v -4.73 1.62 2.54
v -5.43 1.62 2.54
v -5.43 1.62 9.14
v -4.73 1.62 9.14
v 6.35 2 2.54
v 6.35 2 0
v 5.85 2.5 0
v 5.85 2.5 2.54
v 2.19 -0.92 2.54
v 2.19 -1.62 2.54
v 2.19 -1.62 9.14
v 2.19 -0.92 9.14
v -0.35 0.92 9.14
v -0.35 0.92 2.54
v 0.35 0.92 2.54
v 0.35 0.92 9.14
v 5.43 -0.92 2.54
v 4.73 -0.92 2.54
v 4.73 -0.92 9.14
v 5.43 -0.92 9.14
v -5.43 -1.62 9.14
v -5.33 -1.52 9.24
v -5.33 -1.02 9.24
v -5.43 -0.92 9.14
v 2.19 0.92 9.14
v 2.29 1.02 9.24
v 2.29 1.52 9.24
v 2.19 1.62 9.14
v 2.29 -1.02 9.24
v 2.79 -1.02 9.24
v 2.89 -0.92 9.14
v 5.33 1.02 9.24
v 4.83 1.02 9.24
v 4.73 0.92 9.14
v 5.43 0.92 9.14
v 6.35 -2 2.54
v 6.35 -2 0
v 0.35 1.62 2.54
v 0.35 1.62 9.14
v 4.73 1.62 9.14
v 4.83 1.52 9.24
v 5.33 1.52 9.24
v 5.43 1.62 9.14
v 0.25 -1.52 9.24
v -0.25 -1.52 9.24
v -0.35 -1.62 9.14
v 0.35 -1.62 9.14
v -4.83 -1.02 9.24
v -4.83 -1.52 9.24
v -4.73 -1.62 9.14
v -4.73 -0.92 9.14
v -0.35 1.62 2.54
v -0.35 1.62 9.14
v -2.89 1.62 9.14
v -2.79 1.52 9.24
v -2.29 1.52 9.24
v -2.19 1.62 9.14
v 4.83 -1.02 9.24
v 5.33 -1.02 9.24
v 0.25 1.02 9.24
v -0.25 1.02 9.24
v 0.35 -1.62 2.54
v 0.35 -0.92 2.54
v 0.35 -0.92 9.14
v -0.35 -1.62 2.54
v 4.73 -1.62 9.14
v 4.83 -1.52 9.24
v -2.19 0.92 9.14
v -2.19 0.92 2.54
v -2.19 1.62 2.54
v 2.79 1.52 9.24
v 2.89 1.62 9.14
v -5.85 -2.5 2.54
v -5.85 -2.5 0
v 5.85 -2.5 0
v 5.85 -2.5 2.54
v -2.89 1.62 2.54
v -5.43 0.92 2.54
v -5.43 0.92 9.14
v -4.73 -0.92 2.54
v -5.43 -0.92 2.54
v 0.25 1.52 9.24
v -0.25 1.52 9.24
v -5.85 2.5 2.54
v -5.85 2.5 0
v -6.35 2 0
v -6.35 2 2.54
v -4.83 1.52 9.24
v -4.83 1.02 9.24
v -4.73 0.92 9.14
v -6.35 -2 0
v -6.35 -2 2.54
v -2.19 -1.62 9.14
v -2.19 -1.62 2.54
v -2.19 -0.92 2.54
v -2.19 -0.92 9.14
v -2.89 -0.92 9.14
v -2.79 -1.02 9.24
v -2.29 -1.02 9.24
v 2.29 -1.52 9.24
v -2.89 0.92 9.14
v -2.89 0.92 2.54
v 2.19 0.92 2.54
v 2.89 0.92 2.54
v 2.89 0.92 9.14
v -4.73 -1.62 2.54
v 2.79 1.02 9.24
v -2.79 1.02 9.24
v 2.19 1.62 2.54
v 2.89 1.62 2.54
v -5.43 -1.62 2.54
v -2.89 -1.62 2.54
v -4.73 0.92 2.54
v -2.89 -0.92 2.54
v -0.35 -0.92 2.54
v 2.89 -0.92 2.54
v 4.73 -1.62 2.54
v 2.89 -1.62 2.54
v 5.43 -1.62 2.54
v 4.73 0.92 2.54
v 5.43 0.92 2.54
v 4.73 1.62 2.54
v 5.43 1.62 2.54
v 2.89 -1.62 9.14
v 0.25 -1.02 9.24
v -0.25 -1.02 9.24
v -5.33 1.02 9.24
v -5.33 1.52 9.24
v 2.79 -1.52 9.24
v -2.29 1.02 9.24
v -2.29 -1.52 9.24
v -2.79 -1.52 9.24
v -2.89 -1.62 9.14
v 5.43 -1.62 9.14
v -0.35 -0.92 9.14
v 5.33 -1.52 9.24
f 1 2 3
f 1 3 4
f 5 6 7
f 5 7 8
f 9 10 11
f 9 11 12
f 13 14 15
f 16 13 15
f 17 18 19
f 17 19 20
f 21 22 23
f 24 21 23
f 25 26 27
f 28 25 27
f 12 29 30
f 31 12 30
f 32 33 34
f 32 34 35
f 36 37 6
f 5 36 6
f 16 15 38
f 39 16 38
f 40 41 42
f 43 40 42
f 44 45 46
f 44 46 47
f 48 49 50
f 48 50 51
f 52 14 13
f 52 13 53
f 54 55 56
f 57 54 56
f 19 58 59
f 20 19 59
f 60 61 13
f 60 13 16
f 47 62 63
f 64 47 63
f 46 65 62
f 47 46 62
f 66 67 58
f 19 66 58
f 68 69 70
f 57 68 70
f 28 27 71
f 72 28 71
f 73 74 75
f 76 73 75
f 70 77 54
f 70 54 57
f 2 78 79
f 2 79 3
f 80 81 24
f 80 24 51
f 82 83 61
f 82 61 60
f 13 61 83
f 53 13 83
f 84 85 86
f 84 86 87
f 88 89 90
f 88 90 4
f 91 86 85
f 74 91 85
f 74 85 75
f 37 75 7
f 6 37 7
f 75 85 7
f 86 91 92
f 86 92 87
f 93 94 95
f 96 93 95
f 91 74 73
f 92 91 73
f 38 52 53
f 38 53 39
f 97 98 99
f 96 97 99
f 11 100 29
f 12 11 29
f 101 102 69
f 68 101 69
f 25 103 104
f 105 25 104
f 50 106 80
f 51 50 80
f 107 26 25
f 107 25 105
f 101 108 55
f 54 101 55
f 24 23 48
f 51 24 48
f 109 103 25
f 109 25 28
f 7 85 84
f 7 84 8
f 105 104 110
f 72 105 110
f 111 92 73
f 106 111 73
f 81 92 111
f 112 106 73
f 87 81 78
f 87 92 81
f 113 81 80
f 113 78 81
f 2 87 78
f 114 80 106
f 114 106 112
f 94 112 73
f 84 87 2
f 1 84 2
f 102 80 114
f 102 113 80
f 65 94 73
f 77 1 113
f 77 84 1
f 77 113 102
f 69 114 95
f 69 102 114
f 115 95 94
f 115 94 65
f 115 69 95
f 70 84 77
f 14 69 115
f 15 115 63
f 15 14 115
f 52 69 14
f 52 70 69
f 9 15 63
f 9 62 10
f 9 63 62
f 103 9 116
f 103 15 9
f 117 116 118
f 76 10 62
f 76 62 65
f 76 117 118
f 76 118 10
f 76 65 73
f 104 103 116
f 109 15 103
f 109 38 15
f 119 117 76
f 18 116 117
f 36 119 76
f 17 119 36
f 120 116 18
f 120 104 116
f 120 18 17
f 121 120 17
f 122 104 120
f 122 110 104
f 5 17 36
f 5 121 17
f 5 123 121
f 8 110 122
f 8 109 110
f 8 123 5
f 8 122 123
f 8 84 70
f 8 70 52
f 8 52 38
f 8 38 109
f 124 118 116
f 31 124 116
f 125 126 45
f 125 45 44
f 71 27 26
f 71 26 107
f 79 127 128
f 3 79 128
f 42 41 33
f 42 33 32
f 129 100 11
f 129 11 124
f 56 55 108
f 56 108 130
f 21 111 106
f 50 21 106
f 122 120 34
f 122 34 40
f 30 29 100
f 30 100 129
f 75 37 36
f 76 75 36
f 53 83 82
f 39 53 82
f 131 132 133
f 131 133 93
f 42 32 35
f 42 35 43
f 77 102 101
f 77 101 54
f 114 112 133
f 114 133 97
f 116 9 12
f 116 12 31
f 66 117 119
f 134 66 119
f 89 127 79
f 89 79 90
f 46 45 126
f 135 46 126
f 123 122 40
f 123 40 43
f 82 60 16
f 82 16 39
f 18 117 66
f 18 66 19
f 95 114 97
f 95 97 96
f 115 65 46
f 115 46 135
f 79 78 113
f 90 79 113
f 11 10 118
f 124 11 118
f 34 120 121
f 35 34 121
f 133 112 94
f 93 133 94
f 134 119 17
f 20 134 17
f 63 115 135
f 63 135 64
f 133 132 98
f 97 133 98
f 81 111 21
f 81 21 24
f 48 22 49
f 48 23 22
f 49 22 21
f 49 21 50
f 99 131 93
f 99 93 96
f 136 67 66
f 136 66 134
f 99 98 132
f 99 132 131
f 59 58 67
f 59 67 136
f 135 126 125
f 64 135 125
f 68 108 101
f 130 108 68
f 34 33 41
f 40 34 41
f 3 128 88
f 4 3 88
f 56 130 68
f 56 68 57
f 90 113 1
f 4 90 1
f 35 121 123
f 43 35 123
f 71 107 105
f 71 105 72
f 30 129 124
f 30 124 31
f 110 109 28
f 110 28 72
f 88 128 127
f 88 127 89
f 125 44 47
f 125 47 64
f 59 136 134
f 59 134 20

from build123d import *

# Parameters (mm, degrees)
SKETCH1_W           = 12.7
SKETCH1_H           = 5
BOSS_EXTRUDE1_DEPTH = 2.54
SKETCH2_W           = 0.7
SKETCH2_H           = 0.7
BOSS_EXTRUDE2_DEPTH = 6.7
CHAMFER1_SIZE       = 0.5
CHAMFER2_SIZE       = 0.1


with BuildPart() as part:
    # Sketch1 → Boss-Extrude1 (new body)
    with BuildSketch(Plane.XY):
        Rectangle(SKETCH1_W, SKETCH1_H)
    extrude(amount=BOSS_EXTRUDE1_DEPTH)

    # Sketch2 → Boss-Extrude2 (add)
    with BuildSketch(Plane.XY.offset(2.54)):
        with Locations((-2.54, 1.27)):
            Rectangle(SKETCH2_W, SKETCH2_H)
        with Locations((-5.08, 1.27)):
            Rectangle(SKETCH2_W, SKETCH2_H)
        with Locations((0, 1.27)):
            Rectangle(SKETCH2_W, SKETCH2_H)
        with Locations((2.54, 1.27)):
            Rectangle(SKETCH2_W, SKETCH2_H)
        with Locations((5.08, 1.27)):
            Rectangle(SKETCH2_W, SKETCH2_H)
        with Locations((-2.54, -1.27)):
            Rectangle(SKETCH2_W, SKETCH2_H)
        with Locations((0, -1.27)):
            Rectangle(SKETCH2_W, SKETCH2_H)
        with Locations((2.54, -1.27)):
            Rectangle(SKETCH2_W, SKETCH2_H)
        with Locations((5.08, -1.27)):
            Rectangle(SKETCH2_W, SKETCH2_H)
        with Locations((-5.08, -1.27)):
            Rectangle(SKETCH2_W, SKETCH2_H)
    extrude(amount=BOSS_EXTRUDE2_DEPTH)

    # Chamfer1
    chamfer1_edges = [part.edges().sort_by_distance(p)[0] for p in [
        (6.35, -2.5, 1.27),
        (-6.35, -2.5, 1.27),
        (-6.35, 2.5, 1.27),
        (6.35, 2.5, 1.27),
    ]]
    chamfer(chamfer1_edges, length=CHAMFER1_SIZE)

    # Chamfer2
    chamfer2_edges = [part.edges().sort_by_distance(p)[0] for p in [
        (4.73, -1.27, 9.24),
        (5.08, -1.62, 9.24),
        (5.43, -1.27, 9.24),
        (5.08, -0.92, 9.24),
        (-5.08, -1.62, 9.24),
        (-4.73, -1.27, 9.24),
        (-5.08, -0.92, 9.24),
        (-5.43, -1.27, 9.24),
        (-5.43, 1.27, 9.24),
        (-5.08, 0.92, 9.24),
        (-4.73, 1.27, 9.24),
        (-5.08, 1.62, 9.24),
        (-2.89, 1.27, 9.24),
        (-2.54, 0.92, 9.24),
        (-2.19, 1.27, 9.24),
        (-2.54, 1.62, 9.24),
        (-0.35, 1.27, 9.24),
        (0, 0.92, 9.24),
        (0.35, 1.27, 9.24),
        (0, 1.62, 9.24),
        (2.19, 1.27, 9.24),
        (2.54, 0.92, 9.24),
        (2.89, 1.27, 9.24),
        (2.54, 1.62, 9.24),
        (4.73, 1.27, 9.24),
        (5.08, 0.92, 9.24),
        (5.43, 1.27, 9.24),
        (5.08, 1.62, 9.24),
        (-2.89, -1.27, 9.24),
        (-2.54, -1.62, 9.24),
        (-2.19, -1.27, 9.24),
        (-2.54, -0.92, 9.24),
        (-0.35, -1.27, 9.24),
        (0, -1.62, 9.24),
        (0.35, -1.27, 9.24),
        (0, -0.92, 9.24),
        (2.19, -1.27, 9.24),
        (2.54, -1.62, 9.24),
        (2.89, -1.27, 9.24),
        (2.54, -0.92, 9.24),
    ]]
    chamfer(chamfer2_edges, length=CHAMFER2_SIZE)


solid = part.part
